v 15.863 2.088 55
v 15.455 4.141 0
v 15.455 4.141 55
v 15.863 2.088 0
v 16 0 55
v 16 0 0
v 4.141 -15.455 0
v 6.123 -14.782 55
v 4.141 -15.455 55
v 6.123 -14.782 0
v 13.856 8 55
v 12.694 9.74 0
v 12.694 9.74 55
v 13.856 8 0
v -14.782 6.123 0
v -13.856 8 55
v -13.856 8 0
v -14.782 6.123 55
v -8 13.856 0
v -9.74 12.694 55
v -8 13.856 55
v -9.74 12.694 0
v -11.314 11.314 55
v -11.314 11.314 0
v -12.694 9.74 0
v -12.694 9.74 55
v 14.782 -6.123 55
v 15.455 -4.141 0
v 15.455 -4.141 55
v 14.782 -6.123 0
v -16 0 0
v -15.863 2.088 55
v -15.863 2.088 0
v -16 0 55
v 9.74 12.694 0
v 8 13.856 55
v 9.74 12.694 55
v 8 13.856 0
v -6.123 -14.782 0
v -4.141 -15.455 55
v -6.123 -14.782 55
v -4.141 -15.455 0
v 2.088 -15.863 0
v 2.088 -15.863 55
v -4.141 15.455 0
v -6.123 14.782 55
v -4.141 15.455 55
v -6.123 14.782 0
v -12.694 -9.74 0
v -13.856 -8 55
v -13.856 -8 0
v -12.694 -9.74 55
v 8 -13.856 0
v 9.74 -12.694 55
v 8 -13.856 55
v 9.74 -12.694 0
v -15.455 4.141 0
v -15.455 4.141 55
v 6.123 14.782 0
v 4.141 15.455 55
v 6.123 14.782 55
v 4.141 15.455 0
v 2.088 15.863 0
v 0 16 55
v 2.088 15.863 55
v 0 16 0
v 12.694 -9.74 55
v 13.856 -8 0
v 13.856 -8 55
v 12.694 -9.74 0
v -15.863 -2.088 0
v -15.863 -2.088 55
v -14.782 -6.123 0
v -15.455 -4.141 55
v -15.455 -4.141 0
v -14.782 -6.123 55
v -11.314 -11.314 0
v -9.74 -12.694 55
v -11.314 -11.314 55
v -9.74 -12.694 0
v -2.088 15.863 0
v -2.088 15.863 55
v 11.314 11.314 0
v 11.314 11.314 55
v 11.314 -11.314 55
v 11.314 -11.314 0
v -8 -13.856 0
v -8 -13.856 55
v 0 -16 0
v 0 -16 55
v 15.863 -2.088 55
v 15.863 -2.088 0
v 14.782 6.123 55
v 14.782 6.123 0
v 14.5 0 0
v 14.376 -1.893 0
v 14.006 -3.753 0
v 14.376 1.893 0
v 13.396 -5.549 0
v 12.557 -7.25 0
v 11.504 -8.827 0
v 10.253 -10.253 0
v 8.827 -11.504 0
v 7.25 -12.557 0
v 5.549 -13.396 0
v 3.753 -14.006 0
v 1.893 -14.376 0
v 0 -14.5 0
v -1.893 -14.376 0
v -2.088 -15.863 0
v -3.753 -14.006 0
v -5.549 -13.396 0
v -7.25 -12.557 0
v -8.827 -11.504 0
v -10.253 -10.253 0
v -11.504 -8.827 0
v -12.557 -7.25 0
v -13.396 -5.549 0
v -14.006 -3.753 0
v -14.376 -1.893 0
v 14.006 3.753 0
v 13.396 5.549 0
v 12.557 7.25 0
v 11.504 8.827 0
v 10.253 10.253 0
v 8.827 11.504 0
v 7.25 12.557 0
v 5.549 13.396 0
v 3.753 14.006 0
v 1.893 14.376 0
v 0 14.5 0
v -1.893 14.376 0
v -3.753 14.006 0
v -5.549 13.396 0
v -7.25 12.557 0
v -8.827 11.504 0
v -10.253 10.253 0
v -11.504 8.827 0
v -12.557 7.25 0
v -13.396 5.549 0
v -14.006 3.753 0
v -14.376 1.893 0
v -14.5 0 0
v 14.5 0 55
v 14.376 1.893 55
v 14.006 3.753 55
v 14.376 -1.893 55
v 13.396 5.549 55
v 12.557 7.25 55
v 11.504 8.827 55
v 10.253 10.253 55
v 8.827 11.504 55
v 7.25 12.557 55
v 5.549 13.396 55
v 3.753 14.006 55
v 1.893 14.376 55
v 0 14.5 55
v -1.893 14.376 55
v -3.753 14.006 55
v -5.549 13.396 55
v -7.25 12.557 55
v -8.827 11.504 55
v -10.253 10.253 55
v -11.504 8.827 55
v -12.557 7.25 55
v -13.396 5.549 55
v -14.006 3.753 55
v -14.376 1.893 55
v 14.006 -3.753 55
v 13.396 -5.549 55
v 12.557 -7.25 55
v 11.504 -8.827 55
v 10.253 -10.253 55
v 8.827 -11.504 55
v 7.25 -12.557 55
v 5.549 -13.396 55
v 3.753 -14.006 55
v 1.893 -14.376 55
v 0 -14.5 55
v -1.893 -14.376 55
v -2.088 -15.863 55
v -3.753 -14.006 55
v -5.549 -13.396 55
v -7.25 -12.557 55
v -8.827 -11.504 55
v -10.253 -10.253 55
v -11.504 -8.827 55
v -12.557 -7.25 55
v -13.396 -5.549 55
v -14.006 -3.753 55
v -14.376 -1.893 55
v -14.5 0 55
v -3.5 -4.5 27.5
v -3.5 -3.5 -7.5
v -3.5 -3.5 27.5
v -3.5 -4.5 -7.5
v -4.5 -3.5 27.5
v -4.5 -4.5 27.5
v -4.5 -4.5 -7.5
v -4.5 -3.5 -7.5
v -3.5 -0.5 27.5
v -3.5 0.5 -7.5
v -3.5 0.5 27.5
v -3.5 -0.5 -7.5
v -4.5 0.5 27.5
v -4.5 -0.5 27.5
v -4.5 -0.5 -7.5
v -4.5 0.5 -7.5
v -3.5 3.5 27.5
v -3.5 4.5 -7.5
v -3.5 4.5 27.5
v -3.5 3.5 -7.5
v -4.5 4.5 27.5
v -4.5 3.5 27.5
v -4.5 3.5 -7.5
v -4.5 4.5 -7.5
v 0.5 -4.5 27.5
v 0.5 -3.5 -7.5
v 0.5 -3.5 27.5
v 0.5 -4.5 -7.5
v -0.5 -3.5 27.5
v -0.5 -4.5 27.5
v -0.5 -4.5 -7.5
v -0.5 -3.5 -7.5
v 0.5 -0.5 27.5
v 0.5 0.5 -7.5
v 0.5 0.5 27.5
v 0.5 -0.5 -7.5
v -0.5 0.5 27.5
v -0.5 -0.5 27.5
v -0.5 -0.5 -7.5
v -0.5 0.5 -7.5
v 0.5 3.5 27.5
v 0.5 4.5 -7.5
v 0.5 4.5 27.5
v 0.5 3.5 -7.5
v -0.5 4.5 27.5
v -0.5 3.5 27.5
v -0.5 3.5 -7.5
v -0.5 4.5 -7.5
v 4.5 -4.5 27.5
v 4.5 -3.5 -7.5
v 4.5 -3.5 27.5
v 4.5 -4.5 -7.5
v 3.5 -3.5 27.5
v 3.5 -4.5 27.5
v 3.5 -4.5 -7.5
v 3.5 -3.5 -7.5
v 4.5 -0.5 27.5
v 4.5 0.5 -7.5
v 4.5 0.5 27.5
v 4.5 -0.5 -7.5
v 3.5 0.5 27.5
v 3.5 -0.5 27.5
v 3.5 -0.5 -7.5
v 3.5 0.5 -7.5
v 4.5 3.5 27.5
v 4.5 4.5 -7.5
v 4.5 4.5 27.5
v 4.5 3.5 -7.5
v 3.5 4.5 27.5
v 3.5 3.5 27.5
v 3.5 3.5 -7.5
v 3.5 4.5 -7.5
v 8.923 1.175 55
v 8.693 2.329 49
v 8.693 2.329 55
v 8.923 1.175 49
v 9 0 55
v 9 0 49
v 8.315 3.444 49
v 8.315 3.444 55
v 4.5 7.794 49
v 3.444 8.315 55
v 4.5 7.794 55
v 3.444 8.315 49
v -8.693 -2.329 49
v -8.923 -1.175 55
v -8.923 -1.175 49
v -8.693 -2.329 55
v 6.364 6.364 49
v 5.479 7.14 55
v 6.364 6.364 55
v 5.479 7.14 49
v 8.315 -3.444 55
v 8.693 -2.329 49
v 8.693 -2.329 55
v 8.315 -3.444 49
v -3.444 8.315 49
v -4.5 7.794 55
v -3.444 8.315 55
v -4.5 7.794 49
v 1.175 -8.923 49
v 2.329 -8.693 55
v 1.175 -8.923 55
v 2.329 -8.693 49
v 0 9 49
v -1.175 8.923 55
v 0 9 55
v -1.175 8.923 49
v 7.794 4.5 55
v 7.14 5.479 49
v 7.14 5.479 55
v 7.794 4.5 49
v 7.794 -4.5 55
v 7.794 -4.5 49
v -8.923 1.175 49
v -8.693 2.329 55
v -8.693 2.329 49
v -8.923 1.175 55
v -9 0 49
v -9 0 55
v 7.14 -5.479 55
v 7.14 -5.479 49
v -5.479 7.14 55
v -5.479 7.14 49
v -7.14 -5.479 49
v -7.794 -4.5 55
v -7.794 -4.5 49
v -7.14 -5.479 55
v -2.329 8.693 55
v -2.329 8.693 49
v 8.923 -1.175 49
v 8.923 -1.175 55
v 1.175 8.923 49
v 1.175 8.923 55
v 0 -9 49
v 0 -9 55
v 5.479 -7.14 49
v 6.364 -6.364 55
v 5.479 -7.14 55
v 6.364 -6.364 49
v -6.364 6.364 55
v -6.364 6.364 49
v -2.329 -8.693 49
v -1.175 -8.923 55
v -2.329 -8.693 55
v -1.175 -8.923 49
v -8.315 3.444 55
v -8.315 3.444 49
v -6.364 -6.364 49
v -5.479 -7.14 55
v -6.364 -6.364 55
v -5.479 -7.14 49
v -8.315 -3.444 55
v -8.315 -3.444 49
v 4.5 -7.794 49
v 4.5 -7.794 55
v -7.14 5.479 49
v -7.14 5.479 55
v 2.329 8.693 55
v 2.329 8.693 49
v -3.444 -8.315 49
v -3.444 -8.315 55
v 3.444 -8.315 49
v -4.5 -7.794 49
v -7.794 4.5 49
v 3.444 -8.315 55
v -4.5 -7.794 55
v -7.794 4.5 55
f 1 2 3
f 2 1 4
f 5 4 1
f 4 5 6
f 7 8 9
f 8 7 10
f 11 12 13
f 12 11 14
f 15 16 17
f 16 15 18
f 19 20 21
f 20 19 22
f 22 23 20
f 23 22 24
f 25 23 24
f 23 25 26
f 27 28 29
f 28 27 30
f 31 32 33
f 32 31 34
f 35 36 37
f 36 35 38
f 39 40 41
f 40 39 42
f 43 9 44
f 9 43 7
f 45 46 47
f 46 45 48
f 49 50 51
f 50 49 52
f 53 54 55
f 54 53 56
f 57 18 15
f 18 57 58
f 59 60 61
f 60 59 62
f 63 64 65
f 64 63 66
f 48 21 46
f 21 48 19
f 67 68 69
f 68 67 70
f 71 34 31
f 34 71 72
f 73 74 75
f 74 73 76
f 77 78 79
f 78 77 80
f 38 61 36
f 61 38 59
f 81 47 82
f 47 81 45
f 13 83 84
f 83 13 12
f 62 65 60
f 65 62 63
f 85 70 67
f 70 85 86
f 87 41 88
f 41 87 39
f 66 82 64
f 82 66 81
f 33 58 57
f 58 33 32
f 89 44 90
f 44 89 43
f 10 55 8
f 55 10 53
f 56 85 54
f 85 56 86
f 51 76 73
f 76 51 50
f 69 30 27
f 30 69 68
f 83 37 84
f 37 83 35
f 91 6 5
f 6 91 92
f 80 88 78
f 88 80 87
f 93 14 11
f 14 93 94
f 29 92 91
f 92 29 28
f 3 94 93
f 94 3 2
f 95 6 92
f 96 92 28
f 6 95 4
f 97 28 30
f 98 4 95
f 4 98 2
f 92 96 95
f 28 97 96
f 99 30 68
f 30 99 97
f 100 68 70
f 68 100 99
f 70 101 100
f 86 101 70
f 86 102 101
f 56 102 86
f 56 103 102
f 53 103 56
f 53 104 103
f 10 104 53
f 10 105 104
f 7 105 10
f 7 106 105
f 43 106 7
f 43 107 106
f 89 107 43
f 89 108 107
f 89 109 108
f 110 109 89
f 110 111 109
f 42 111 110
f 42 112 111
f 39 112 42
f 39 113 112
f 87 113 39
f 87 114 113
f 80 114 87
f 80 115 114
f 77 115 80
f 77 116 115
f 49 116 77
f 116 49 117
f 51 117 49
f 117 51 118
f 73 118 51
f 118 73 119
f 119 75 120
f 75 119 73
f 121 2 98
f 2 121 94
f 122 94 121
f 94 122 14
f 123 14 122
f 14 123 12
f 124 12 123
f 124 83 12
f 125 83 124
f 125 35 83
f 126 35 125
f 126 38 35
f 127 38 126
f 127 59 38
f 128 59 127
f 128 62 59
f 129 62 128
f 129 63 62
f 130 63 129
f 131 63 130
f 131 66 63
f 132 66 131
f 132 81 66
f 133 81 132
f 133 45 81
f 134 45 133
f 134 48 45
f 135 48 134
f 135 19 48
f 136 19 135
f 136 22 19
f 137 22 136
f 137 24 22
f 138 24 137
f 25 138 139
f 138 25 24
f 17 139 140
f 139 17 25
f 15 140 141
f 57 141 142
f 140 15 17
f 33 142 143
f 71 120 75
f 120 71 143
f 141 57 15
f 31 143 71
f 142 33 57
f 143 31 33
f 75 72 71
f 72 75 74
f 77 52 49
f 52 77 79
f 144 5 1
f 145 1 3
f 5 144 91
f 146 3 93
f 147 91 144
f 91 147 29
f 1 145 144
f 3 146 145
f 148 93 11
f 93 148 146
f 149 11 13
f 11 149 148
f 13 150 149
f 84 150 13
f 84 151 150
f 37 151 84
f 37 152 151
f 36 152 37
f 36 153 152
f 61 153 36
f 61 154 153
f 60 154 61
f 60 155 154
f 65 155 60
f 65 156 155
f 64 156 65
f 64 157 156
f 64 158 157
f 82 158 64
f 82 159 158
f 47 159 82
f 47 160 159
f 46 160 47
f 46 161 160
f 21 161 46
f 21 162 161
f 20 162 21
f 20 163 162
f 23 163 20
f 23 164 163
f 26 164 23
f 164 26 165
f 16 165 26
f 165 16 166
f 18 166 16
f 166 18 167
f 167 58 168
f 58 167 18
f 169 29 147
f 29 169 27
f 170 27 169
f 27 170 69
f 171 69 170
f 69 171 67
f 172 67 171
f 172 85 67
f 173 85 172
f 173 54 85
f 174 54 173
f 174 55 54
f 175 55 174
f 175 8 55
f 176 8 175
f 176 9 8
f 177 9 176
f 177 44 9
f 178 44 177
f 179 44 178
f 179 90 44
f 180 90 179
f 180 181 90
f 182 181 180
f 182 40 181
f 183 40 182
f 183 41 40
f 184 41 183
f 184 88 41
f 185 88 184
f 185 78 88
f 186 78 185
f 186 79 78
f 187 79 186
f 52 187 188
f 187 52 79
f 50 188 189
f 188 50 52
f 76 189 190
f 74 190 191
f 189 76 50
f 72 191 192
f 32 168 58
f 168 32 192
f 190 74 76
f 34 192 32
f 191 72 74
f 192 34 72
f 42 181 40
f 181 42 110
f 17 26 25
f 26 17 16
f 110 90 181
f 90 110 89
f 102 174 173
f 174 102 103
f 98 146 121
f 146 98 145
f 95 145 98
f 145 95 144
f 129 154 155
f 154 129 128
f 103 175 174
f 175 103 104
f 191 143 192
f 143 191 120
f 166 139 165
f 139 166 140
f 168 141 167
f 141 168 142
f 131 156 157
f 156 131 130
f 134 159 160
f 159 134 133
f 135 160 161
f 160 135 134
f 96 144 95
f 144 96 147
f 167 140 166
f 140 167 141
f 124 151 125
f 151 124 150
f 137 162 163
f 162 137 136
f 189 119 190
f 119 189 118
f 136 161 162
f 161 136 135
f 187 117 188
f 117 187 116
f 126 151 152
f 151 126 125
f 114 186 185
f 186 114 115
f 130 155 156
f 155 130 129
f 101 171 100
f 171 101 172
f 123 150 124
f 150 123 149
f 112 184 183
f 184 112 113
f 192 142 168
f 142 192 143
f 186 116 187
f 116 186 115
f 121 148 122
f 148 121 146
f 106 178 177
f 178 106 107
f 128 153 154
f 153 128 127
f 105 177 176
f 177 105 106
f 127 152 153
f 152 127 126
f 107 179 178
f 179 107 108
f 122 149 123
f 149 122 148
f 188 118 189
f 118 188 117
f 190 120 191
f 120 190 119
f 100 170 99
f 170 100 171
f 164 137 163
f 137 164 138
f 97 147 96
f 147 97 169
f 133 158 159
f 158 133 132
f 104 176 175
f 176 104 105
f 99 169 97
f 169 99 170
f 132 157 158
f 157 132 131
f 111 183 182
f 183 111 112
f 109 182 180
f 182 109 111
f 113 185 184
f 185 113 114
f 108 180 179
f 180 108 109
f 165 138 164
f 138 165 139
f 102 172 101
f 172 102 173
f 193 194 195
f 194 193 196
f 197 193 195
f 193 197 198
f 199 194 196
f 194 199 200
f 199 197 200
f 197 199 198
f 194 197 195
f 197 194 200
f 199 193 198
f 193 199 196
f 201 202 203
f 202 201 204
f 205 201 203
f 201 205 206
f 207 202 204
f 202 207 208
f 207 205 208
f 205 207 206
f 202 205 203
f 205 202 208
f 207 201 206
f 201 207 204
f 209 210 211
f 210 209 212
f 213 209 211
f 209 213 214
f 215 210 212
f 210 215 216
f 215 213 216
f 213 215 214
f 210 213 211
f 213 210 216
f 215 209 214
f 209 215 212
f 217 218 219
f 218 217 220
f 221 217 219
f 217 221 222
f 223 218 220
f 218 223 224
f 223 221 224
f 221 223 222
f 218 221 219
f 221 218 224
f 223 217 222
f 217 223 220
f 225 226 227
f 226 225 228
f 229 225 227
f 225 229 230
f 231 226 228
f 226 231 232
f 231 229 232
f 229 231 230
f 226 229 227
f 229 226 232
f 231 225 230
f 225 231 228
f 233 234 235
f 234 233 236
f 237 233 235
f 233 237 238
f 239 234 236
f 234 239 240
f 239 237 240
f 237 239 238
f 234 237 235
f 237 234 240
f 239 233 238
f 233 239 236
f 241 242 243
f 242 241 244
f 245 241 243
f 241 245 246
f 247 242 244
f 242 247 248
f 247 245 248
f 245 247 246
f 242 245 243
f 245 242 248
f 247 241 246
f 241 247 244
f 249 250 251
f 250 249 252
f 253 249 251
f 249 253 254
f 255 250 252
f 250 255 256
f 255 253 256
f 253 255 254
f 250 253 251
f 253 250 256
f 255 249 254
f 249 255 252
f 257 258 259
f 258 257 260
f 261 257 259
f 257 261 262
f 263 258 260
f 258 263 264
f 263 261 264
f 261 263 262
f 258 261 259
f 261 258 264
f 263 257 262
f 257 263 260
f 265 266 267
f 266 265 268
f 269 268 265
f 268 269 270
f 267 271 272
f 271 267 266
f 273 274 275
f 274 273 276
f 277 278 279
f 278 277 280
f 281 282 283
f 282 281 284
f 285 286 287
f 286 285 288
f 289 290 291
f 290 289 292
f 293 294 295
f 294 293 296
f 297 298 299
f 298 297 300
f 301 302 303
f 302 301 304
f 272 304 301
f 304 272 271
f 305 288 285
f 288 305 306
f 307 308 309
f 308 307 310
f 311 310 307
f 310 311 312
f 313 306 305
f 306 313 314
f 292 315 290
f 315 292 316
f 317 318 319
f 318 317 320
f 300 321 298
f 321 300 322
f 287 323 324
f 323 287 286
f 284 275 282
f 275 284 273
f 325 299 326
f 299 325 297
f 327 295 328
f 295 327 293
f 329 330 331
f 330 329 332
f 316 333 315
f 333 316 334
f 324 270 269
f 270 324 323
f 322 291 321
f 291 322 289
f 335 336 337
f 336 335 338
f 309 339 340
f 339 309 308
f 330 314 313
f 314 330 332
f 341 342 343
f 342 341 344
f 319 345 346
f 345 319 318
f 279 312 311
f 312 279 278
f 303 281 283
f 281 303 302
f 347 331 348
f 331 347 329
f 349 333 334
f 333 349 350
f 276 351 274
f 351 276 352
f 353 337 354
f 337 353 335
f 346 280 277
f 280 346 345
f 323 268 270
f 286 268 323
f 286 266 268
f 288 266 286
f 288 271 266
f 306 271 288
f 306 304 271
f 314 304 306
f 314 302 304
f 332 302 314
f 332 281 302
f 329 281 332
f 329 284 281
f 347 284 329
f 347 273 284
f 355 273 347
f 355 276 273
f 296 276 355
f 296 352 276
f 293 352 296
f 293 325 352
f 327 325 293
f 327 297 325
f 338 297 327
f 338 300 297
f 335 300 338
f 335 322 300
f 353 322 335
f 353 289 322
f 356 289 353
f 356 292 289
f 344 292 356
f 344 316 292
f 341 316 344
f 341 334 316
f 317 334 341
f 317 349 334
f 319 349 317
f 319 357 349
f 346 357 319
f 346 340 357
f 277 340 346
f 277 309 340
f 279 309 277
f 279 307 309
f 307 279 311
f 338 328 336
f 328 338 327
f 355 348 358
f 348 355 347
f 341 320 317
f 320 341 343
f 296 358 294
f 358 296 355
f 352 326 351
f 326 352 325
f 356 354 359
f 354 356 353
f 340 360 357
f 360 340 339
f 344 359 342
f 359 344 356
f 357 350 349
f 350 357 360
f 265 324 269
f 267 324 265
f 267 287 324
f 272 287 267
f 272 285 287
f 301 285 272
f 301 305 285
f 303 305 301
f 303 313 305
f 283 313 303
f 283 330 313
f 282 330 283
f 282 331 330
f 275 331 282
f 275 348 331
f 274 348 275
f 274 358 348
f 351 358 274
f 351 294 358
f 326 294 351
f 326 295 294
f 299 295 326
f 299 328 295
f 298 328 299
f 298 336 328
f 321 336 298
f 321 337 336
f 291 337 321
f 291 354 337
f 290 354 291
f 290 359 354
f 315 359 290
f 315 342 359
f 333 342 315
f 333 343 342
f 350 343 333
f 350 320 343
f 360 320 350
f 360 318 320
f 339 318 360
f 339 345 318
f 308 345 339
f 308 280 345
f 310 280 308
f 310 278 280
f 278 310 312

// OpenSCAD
// GymStim shot capsule — standalone pre-workout shot, screw-on shaker style
// Small strong mix (~30-40 ml), not a full drink. Works with any tier.

OD = 32;                 // slightly slimmer than stick
H = 55;
wall = 1.5;
neck_d = 18;

module capsule_body() {
  difference() {
    cylinder(d=OD, h=H, $fn=48);
    translate([0,0,-1]) cylinder(d=OD-2*wall, h=H+2, $fn=48);
  }
}

module screw_neck() {
  translate([0,0,H-6]) cylinder(d=neck_d, h=6, $fn=48);
}

module shaker_grid() {
  // internal grid to break clumps on shake
  for (i=[-1:1]) for (j=[-1:1])
    translate([i*4, j*4, 10]) cube([1,1,H-20], center=true);
}

capsule_body();
screw_neck();
shaker_grid();
